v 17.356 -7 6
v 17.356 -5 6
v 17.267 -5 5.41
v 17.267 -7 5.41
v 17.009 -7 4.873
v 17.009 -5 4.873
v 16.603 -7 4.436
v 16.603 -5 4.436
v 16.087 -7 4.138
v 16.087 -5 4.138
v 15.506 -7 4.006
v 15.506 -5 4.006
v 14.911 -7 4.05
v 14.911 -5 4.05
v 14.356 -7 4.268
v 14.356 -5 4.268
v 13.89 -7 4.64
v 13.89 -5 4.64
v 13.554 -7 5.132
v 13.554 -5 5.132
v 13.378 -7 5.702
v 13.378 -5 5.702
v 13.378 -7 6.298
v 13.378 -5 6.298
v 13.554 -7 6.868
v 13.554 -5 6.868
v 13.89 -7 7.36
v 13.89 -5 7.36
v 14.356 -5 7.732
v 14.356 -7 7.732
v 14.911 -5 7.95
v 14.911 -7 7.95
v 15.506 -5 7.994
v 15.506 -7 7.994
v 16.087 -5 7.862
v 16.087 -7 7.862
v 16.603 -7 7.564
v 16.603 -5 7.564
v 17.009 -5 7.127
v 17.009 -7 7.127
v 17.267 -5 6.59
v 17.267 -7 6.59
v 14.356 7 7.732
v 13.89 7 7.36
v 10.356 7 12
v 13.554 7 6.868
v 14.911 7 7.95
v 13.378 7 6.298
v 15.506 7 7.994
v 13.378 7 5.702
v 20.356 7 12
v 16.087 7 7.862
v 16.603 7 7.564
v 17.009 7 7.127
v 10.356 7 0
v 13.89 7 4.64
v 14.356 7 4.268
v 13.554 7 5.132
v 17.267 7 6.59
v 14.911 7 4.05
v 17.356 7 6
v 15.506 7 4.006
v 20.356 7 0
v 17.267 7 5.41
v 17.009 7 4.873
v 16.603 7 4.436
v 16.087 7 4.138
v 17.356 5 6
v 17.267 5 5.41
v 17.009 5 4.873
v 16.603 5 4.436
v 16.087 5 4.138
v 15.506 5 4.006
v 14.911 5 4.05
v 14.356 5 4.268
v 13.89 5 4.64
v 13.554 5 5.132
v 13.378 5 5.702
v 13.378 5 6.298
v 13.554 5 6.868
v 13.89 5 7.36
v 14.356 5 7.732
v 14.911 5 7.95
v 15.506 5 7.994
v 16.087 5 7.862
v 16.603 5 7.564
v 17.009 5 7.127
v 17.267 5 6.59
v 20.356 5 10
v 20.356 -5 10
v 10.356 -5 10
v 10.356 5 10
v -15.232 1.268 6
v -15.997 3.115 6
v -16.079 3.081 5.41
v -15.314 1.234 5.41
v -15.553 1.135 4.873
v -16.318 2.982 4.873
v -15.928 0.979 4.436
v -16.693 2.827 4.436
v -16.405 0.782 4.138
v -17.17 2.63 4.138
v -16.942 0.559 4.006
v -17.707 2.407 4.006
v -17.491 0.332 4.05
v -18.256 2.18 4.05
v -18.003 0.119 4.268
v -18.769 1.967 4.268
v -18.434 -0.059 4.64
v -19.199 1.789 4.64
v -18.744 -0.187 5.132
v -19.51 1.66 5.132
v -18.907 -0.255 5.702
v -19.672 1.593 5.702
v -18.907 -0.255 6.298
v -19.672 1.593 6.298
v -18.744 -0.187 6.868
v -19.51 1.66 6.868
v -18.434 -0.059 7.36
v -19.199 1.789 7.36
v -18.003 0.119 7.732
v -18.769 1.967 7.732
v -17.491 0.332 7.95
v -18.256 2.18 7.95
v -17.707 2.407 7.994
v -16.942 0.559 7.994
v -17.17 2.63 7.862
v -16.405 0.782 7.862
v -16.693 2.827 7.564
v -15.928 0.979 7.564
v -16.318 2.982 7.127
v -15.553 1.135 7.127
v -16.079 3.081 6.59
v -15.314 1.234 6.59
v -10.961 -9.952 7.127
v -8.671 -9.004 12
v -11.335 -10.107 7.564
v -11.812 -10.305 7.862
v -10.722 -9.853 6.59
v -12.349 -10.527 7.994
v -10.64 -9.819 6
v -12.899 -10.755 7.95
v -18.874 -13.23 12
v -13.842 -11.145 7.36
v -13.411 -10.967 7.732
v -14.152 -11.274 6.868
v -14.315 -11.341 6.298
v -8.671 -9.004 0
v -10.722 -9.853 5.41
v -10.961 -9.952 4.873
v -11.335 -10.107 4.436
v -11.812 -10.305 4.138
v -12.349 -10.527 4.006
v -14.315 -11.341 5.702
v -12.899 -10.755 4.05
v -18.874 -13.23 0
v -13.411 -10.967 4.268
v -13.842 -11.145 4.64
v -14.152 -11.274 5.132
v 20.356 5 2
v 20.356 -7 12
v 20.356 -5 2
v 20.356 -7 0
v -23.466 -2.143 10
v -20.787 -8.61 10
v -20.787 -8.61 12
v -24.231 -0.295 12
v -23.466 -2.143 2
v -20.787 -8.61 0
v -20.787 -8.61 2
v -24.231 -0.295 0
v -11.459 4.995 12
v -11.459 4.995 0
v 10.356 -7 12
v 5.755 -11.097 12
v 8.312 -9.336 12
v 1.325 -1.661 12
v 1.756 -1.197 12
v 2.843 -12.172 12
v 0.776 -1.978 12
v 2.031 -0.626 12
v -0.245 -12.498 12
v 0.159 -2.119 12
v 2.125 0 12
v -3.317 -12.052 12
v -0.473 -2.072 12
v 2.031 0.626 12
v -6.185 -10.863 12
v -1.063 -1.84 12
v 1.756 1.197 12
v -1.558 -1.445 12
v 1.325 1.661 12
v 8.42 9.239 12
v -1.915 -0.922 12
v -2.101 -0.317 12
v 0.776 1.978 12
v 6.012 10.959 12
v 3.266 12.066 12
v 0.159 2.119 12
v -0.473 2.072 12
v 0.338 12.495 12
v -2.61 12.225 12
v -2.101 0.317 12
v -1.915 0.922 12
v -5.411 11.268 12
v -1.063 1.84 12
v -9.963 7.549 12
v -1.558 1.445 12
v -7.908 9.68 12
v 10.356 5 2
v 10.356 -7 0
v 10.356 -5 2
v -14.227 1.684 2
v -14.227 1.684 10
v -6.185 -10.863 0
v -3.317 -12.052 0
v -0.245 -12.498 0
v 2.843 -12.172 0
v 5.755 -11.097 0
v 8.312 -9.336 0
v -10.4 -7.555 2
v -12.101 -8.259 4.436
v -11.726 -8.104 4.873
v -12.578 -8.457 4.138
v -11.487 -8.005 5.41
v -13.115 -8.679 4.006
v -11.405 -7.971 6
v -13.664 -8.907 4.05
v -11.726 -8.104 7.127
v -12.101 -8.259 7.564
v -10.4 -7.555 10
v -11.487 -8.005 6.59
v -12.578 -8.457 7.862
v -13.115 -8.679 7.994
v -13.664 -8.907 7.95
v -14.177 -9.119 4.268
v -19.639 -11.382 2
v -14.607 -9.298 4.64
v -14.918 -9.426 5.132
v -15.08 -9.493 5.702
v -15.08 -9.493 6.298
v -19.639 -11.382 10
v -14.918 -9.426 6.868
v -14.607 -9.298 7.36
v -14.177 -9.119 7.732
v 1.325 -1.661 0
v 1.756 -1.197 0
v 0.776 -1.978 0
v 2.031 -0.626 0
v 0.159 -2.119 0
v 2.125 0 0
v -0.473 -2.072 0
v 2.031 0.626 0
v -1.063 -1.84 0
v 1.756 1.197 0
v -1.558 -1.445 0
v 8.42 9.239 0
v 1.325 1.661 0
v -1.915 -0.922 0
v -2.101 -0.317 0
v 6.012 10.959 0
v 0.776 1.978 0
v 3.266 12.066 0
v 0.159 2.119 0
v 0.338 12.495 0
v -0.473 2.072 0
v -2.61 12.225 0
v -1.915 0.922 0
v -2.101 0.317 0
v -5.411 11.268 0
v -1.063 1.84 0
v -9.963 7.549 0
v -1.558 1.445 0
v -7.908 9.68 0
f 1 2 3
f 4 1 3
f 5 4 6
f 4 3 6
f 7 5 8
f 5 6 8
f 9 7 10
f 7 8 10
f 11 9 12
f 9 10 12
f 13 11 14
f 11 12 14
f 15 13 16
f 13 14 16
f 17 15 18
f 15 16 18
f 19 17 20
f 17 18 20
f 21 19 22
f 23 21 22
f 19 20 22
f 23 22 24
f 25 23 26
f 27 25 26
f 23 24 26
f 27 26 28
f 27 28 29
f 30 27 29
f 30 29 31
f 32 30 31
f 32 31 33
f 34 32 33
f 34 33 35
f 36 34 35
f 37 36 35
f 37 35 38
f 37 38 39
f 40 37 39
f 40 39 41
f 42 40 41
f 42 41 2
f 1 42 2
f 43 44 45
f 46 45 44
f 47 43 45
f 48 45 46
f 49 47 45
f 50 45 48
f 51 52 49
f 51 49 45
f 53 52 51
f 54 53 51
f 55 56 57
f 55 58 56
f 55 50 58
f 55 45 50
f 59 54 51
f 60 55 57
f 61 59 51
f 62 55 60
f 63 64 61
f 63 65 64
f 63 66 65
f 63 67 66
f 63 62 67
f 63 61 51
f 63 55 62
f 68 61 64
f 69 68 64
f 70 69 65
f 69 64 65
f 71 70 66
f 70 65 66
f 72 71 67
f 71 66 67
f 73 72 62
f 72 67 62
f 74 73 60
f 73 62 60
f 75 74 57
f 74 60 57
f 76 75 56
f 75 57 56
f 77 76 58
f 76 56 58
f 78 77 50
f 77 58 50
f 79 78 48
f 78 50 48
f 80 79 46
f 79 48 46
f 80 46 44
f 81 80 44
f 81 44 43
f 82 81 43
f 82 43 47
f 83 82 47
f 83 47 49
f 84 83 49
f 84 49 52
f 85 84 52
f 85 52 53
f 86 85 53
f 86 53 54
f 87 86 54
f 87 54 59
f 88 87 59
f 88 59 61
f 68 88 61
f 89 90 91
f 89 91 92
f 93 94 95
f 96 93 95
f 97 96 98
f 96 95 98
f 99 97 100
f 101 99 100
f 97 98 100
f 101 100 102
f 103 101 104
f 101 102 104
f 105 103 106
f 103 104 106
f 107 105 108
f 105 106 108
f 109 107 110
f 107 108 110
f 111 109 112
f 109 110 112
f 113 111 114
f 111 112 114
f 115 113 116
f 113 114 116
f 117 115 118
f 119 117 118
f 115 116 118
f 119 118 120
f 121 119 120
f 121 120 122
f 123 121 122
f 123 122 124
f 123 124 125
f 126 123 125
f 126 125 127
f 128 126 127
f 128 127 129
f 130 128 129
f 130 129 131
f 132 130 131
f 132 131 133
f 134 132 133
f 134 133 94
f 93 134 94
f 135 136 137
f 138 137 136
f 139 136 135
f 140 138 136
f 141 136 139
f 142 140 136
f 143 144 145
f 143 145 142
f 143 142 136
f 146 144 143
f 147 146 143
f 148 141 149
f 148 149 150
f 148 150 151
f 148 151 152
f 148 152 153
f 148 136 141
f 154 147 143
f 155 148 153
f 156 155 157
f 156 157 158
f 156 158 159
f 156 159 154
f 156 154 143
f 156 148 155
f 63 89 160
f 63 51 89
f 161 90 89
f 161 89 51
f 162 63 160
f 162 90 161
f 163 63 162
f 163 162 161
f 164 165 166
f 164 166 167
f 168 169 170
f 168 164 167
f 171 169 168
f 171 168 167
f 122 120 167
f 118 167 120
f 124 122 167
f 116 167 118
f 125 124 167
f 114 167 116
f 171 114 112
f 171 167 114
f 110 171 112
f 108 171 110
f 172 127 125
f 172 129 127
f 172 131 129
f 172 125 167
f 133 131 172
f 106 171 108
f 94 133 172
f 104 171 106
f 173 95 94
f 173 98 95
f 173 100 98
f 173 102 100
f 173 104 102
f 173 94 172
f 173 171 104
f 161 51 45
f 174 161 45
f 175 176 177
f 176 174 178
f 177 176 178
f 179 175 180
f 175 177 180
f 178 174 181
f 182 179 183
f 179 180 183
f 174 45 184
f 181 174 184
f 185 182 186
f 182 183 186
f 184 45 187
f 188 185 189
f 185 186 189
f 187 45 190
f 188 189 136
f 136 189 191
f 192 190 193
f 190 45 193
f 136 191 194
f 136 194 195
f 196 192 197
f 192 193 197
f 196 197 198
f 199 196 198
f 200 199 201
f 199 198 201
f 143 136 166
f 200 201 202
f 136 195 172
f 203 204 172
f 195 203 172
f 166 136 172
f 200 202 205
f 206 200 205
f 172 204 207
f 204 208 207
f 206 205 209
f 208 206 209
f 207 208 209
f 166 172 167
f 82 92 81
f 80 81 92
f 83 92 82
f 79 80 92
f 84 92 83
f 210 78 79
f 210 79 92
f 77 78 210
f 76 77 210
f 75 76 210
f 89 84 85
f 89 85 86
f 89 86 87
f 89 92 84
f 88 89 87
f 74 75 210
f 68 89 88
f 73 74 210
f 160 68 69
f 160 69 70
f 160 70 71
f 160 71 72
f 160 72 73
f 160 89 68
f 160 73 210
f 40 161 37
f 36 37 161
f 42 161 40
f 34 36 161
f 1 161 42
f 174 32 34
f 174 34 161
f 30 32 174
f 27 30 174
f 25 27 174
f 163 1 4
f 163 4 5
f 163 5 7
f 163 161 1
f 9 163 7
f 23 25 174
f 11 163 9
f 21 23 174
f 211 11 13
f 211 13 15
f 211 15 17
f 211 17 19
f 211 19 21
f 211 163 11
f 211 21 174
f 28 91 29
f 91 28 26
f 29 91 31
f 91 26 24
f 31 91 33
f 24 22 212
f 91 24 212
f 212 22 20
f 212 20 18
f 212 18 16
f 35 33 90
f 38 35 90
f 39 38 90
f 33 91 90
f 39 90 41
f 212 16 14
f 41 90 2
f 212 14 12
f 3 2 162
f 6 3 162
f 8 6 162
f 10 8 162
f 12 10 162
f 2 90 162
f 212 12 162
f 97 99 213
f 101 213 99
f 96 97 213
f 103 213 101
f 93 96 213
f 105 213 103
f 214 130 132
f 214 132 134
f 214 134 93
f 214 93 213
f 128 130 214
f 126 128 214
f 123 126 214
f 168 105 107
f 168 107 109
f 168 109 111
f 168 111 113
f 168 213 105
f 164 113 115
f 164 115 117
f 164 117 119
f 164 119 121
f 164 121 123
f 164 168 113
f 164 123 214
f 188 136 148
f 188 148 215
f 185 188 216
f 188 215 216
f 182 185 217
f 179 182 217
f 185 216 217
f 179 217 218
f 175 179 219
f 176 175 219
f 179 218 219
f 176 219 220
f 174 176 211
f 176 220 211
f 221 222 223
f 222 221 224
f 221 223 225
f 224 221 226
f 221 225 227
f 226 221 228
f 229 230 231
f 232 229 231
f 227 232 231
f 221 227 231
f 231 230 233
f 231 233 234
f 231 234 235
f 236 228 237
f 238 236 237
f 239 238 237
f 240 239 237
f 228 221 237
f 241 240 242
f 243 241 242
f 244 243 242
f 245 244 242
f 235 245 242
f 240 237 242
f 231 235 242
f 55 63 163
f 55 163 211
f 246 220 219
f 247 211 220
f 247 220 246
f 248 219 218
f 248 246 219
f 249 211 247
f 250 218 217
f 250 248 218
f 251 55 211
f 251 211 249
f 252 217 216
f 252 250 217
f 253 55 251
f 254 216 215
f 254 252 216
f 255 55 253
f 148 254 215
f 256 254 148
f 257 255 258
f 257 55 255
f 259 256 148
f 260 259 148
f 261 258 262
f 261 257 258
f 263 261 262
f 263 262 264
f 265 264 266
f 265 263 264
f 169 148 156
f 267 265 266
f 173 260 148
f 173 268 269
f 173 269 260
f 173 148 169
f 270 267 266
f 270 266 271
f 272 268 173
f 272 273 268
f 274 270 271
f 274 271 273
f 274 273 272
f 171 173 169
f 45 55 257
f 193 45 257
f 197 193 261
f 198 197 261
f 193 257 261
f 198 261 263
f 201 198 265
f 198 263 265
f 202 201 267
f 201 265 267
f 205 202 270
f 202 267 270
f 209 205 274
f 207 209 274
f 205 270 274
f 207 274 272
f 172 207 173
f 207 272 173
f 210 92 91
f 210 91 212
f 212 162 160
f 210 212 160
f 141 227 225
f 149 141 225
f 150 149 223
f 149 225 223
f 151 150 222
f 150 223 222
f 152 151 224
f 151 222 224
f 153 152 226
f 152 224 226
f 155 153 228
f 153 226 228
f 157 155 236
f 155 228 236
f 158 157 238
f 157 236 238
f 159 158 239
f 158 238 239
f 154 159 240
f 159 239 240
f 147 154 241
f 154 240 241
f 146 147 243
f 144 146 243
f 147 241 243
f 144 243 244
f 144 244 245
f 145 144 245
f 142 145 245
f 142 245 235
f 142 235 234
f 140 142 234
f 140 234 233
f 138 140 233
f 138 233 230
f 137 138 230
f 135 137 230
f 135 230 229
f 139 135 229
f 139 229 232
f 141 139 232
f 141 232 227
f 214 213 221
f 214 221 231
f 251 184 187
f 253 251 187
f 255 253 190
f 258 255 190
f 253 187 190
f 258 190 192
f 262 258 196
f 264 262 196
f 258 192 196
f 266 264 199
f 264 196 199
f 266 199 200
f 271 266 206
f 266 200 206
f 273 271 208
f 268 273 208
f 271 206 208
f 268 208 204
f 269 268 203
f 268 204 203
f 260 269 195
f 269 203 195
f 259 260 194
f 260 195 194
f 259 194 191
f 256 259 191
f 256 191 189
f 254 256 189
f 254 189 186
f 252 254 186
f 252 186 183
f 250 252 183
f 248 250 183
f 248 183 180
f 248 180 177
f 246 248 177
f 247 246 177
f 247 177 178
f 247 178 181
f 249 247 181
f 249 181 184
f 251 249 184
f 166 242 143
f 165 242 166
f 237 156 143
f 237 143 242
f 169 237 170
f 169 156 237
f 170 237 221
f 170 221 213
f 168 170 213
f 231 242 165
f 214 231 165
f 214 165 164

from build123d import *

# Parameters (mm, degrees)
SKETCH1_R           = 12.5
BOSS_EXTRUDE2_DEPTH = 12
CUT_EXTRUDE3_REACH  = 14
SKETCH5_R           = 2.125
BOSS_EXTRUDE3_DEPTH = 12
SKETCH9_W           = 8
SKETCH9_H           = 10
CUT_EXTRUDE4_DEPTH  = 10
SKETCH10_W          = 8
SKETCH10_H          = 10
CUT_EXTRUDE5_DEPTH  = 10
SKETCH11_R          = 2
CUT_EXTRUDE6_DEPTH  = 21.229774891
SKETCH12_R          = 2
CUT_EXTRUDE7_DEPTH  = 30.012682497


with BuildPart() as part:
    # Sketch1 → Boss-Extrude2 (new body)
    with BuildSketch(Plane.XY):
        Circle(SKETCH1_R)
    extrude(amount=BOSS_EXTRUDE2_DEPTH)

    # Sketch5 → Cut-Extrude3 (cut, up to next)
    with BuildSketch(Plane.XY.offset(12), mode=Mode.PRIVATE) as cut_extrude3_sk1:
        Circle(SKETCH5_R)
    cut_extrude3_tool1 = extrude(cut_extrude3_sk1.sketch, amount=-CUT_EXTRUDE3_REACH, mode=Mode.PRIVATE) & part.part
    add(cut_extrude3_tool1.solids().sort_by_distance((0, 0, 12))[0], mode=Mode.SUBTRACT)

    # Sketch6 → Boss-Extrude3 (add)
    with BuildSketch(Plane.XY):
        with BuildLine():
            Line((10.356157589, 7), (20.356157589, 7))
            Line((20.356157589, 7), (20.356157589, -7))
            Line((20.356157589, -7), (10.356157589, -7))
            ThreePointArc((10.356157589, -7), (12.5, 0), (10.356157589, 7))
        make_face()
        with BuildLine():
            Line((-24.231440373, -0.295461436), (-11.458506302, 4.995261088))
            ThreePointArc((-11.458506302, 4.995261088), (-12.259311424, -2.441164357), (-8.670952565, -9.003587153))
            Line((-8.670952565, -9.003587153), (-18.87387232, -13.229774891))
            Line((-18.87387232, -13.229774891), (-20.787289482, -8.610377228))
            Line((-20.787289482, -8.610377228), (-24.231440373, -0.295461436))
        make_face()
    extrude(amount=BOSS_EXTRUDE3_DEPTH)

    # Sketch9 → Cut-Extrude4 (cut)
    with BuildSketch(Plane(origin=(20.356157589, 0, 0), x_dir=(0, 0, -1), z_dir=(1, 0, 0))):
        with Locations((-6, 0)):
            Rectangle(SKETCH9_W, SKETCH9_H)
    extrude(amount=-CUT_EXTRUDE4_DEPTH, mode=Mode.SUBTRACT)

    # Sketch10 → Cut-Extrude5 (cut)
    with BuildSketch(Plane(origin=(-20.787289482, -8.610377228, 0), x_dir=(0, 0, 1), z_dir=(-0.923879533, -0.382683432, 0))):
        with Locations((6, 2)):
            Rectangle(SKETCH10_W, SKETCH10_H)
    extrude(amount=-CUT_EXTRUDE5_DEPTH, mode=Mode.SUBTRACT)

    # Sketch11 → Cut-Extrude6 (cut, through all)
    with BuildSketch(Plane(origin=(0, 7, 0), x_dir=(1, 0, 0), z_dir=(0, 1, 0))):
        with Locations((15.356157589, -6)):
            Circle(SKETCH11_R)
    extrude(amount=-CUT_EXTRUDE6_DEPTH, mode=Mode.SUBTRACT)

    # Sketch12 → Cut-Extrude7 (cut, through all)
    with BuildSketch(Plane(origin=(-3.444150891, 8.314915793, 0), x_dir=(0.923879533, 0.382683432, 0), z_dir=(-0.382683432, 0.923879533, 0))):
        with Locations((-15.587337893, -6)):
            Circle(SKETCH12_R)
    extrude(amount=-CUT_EXTRUDE7_DEPTH, mode=Mode.SUBTRACT)


solid = part.part
